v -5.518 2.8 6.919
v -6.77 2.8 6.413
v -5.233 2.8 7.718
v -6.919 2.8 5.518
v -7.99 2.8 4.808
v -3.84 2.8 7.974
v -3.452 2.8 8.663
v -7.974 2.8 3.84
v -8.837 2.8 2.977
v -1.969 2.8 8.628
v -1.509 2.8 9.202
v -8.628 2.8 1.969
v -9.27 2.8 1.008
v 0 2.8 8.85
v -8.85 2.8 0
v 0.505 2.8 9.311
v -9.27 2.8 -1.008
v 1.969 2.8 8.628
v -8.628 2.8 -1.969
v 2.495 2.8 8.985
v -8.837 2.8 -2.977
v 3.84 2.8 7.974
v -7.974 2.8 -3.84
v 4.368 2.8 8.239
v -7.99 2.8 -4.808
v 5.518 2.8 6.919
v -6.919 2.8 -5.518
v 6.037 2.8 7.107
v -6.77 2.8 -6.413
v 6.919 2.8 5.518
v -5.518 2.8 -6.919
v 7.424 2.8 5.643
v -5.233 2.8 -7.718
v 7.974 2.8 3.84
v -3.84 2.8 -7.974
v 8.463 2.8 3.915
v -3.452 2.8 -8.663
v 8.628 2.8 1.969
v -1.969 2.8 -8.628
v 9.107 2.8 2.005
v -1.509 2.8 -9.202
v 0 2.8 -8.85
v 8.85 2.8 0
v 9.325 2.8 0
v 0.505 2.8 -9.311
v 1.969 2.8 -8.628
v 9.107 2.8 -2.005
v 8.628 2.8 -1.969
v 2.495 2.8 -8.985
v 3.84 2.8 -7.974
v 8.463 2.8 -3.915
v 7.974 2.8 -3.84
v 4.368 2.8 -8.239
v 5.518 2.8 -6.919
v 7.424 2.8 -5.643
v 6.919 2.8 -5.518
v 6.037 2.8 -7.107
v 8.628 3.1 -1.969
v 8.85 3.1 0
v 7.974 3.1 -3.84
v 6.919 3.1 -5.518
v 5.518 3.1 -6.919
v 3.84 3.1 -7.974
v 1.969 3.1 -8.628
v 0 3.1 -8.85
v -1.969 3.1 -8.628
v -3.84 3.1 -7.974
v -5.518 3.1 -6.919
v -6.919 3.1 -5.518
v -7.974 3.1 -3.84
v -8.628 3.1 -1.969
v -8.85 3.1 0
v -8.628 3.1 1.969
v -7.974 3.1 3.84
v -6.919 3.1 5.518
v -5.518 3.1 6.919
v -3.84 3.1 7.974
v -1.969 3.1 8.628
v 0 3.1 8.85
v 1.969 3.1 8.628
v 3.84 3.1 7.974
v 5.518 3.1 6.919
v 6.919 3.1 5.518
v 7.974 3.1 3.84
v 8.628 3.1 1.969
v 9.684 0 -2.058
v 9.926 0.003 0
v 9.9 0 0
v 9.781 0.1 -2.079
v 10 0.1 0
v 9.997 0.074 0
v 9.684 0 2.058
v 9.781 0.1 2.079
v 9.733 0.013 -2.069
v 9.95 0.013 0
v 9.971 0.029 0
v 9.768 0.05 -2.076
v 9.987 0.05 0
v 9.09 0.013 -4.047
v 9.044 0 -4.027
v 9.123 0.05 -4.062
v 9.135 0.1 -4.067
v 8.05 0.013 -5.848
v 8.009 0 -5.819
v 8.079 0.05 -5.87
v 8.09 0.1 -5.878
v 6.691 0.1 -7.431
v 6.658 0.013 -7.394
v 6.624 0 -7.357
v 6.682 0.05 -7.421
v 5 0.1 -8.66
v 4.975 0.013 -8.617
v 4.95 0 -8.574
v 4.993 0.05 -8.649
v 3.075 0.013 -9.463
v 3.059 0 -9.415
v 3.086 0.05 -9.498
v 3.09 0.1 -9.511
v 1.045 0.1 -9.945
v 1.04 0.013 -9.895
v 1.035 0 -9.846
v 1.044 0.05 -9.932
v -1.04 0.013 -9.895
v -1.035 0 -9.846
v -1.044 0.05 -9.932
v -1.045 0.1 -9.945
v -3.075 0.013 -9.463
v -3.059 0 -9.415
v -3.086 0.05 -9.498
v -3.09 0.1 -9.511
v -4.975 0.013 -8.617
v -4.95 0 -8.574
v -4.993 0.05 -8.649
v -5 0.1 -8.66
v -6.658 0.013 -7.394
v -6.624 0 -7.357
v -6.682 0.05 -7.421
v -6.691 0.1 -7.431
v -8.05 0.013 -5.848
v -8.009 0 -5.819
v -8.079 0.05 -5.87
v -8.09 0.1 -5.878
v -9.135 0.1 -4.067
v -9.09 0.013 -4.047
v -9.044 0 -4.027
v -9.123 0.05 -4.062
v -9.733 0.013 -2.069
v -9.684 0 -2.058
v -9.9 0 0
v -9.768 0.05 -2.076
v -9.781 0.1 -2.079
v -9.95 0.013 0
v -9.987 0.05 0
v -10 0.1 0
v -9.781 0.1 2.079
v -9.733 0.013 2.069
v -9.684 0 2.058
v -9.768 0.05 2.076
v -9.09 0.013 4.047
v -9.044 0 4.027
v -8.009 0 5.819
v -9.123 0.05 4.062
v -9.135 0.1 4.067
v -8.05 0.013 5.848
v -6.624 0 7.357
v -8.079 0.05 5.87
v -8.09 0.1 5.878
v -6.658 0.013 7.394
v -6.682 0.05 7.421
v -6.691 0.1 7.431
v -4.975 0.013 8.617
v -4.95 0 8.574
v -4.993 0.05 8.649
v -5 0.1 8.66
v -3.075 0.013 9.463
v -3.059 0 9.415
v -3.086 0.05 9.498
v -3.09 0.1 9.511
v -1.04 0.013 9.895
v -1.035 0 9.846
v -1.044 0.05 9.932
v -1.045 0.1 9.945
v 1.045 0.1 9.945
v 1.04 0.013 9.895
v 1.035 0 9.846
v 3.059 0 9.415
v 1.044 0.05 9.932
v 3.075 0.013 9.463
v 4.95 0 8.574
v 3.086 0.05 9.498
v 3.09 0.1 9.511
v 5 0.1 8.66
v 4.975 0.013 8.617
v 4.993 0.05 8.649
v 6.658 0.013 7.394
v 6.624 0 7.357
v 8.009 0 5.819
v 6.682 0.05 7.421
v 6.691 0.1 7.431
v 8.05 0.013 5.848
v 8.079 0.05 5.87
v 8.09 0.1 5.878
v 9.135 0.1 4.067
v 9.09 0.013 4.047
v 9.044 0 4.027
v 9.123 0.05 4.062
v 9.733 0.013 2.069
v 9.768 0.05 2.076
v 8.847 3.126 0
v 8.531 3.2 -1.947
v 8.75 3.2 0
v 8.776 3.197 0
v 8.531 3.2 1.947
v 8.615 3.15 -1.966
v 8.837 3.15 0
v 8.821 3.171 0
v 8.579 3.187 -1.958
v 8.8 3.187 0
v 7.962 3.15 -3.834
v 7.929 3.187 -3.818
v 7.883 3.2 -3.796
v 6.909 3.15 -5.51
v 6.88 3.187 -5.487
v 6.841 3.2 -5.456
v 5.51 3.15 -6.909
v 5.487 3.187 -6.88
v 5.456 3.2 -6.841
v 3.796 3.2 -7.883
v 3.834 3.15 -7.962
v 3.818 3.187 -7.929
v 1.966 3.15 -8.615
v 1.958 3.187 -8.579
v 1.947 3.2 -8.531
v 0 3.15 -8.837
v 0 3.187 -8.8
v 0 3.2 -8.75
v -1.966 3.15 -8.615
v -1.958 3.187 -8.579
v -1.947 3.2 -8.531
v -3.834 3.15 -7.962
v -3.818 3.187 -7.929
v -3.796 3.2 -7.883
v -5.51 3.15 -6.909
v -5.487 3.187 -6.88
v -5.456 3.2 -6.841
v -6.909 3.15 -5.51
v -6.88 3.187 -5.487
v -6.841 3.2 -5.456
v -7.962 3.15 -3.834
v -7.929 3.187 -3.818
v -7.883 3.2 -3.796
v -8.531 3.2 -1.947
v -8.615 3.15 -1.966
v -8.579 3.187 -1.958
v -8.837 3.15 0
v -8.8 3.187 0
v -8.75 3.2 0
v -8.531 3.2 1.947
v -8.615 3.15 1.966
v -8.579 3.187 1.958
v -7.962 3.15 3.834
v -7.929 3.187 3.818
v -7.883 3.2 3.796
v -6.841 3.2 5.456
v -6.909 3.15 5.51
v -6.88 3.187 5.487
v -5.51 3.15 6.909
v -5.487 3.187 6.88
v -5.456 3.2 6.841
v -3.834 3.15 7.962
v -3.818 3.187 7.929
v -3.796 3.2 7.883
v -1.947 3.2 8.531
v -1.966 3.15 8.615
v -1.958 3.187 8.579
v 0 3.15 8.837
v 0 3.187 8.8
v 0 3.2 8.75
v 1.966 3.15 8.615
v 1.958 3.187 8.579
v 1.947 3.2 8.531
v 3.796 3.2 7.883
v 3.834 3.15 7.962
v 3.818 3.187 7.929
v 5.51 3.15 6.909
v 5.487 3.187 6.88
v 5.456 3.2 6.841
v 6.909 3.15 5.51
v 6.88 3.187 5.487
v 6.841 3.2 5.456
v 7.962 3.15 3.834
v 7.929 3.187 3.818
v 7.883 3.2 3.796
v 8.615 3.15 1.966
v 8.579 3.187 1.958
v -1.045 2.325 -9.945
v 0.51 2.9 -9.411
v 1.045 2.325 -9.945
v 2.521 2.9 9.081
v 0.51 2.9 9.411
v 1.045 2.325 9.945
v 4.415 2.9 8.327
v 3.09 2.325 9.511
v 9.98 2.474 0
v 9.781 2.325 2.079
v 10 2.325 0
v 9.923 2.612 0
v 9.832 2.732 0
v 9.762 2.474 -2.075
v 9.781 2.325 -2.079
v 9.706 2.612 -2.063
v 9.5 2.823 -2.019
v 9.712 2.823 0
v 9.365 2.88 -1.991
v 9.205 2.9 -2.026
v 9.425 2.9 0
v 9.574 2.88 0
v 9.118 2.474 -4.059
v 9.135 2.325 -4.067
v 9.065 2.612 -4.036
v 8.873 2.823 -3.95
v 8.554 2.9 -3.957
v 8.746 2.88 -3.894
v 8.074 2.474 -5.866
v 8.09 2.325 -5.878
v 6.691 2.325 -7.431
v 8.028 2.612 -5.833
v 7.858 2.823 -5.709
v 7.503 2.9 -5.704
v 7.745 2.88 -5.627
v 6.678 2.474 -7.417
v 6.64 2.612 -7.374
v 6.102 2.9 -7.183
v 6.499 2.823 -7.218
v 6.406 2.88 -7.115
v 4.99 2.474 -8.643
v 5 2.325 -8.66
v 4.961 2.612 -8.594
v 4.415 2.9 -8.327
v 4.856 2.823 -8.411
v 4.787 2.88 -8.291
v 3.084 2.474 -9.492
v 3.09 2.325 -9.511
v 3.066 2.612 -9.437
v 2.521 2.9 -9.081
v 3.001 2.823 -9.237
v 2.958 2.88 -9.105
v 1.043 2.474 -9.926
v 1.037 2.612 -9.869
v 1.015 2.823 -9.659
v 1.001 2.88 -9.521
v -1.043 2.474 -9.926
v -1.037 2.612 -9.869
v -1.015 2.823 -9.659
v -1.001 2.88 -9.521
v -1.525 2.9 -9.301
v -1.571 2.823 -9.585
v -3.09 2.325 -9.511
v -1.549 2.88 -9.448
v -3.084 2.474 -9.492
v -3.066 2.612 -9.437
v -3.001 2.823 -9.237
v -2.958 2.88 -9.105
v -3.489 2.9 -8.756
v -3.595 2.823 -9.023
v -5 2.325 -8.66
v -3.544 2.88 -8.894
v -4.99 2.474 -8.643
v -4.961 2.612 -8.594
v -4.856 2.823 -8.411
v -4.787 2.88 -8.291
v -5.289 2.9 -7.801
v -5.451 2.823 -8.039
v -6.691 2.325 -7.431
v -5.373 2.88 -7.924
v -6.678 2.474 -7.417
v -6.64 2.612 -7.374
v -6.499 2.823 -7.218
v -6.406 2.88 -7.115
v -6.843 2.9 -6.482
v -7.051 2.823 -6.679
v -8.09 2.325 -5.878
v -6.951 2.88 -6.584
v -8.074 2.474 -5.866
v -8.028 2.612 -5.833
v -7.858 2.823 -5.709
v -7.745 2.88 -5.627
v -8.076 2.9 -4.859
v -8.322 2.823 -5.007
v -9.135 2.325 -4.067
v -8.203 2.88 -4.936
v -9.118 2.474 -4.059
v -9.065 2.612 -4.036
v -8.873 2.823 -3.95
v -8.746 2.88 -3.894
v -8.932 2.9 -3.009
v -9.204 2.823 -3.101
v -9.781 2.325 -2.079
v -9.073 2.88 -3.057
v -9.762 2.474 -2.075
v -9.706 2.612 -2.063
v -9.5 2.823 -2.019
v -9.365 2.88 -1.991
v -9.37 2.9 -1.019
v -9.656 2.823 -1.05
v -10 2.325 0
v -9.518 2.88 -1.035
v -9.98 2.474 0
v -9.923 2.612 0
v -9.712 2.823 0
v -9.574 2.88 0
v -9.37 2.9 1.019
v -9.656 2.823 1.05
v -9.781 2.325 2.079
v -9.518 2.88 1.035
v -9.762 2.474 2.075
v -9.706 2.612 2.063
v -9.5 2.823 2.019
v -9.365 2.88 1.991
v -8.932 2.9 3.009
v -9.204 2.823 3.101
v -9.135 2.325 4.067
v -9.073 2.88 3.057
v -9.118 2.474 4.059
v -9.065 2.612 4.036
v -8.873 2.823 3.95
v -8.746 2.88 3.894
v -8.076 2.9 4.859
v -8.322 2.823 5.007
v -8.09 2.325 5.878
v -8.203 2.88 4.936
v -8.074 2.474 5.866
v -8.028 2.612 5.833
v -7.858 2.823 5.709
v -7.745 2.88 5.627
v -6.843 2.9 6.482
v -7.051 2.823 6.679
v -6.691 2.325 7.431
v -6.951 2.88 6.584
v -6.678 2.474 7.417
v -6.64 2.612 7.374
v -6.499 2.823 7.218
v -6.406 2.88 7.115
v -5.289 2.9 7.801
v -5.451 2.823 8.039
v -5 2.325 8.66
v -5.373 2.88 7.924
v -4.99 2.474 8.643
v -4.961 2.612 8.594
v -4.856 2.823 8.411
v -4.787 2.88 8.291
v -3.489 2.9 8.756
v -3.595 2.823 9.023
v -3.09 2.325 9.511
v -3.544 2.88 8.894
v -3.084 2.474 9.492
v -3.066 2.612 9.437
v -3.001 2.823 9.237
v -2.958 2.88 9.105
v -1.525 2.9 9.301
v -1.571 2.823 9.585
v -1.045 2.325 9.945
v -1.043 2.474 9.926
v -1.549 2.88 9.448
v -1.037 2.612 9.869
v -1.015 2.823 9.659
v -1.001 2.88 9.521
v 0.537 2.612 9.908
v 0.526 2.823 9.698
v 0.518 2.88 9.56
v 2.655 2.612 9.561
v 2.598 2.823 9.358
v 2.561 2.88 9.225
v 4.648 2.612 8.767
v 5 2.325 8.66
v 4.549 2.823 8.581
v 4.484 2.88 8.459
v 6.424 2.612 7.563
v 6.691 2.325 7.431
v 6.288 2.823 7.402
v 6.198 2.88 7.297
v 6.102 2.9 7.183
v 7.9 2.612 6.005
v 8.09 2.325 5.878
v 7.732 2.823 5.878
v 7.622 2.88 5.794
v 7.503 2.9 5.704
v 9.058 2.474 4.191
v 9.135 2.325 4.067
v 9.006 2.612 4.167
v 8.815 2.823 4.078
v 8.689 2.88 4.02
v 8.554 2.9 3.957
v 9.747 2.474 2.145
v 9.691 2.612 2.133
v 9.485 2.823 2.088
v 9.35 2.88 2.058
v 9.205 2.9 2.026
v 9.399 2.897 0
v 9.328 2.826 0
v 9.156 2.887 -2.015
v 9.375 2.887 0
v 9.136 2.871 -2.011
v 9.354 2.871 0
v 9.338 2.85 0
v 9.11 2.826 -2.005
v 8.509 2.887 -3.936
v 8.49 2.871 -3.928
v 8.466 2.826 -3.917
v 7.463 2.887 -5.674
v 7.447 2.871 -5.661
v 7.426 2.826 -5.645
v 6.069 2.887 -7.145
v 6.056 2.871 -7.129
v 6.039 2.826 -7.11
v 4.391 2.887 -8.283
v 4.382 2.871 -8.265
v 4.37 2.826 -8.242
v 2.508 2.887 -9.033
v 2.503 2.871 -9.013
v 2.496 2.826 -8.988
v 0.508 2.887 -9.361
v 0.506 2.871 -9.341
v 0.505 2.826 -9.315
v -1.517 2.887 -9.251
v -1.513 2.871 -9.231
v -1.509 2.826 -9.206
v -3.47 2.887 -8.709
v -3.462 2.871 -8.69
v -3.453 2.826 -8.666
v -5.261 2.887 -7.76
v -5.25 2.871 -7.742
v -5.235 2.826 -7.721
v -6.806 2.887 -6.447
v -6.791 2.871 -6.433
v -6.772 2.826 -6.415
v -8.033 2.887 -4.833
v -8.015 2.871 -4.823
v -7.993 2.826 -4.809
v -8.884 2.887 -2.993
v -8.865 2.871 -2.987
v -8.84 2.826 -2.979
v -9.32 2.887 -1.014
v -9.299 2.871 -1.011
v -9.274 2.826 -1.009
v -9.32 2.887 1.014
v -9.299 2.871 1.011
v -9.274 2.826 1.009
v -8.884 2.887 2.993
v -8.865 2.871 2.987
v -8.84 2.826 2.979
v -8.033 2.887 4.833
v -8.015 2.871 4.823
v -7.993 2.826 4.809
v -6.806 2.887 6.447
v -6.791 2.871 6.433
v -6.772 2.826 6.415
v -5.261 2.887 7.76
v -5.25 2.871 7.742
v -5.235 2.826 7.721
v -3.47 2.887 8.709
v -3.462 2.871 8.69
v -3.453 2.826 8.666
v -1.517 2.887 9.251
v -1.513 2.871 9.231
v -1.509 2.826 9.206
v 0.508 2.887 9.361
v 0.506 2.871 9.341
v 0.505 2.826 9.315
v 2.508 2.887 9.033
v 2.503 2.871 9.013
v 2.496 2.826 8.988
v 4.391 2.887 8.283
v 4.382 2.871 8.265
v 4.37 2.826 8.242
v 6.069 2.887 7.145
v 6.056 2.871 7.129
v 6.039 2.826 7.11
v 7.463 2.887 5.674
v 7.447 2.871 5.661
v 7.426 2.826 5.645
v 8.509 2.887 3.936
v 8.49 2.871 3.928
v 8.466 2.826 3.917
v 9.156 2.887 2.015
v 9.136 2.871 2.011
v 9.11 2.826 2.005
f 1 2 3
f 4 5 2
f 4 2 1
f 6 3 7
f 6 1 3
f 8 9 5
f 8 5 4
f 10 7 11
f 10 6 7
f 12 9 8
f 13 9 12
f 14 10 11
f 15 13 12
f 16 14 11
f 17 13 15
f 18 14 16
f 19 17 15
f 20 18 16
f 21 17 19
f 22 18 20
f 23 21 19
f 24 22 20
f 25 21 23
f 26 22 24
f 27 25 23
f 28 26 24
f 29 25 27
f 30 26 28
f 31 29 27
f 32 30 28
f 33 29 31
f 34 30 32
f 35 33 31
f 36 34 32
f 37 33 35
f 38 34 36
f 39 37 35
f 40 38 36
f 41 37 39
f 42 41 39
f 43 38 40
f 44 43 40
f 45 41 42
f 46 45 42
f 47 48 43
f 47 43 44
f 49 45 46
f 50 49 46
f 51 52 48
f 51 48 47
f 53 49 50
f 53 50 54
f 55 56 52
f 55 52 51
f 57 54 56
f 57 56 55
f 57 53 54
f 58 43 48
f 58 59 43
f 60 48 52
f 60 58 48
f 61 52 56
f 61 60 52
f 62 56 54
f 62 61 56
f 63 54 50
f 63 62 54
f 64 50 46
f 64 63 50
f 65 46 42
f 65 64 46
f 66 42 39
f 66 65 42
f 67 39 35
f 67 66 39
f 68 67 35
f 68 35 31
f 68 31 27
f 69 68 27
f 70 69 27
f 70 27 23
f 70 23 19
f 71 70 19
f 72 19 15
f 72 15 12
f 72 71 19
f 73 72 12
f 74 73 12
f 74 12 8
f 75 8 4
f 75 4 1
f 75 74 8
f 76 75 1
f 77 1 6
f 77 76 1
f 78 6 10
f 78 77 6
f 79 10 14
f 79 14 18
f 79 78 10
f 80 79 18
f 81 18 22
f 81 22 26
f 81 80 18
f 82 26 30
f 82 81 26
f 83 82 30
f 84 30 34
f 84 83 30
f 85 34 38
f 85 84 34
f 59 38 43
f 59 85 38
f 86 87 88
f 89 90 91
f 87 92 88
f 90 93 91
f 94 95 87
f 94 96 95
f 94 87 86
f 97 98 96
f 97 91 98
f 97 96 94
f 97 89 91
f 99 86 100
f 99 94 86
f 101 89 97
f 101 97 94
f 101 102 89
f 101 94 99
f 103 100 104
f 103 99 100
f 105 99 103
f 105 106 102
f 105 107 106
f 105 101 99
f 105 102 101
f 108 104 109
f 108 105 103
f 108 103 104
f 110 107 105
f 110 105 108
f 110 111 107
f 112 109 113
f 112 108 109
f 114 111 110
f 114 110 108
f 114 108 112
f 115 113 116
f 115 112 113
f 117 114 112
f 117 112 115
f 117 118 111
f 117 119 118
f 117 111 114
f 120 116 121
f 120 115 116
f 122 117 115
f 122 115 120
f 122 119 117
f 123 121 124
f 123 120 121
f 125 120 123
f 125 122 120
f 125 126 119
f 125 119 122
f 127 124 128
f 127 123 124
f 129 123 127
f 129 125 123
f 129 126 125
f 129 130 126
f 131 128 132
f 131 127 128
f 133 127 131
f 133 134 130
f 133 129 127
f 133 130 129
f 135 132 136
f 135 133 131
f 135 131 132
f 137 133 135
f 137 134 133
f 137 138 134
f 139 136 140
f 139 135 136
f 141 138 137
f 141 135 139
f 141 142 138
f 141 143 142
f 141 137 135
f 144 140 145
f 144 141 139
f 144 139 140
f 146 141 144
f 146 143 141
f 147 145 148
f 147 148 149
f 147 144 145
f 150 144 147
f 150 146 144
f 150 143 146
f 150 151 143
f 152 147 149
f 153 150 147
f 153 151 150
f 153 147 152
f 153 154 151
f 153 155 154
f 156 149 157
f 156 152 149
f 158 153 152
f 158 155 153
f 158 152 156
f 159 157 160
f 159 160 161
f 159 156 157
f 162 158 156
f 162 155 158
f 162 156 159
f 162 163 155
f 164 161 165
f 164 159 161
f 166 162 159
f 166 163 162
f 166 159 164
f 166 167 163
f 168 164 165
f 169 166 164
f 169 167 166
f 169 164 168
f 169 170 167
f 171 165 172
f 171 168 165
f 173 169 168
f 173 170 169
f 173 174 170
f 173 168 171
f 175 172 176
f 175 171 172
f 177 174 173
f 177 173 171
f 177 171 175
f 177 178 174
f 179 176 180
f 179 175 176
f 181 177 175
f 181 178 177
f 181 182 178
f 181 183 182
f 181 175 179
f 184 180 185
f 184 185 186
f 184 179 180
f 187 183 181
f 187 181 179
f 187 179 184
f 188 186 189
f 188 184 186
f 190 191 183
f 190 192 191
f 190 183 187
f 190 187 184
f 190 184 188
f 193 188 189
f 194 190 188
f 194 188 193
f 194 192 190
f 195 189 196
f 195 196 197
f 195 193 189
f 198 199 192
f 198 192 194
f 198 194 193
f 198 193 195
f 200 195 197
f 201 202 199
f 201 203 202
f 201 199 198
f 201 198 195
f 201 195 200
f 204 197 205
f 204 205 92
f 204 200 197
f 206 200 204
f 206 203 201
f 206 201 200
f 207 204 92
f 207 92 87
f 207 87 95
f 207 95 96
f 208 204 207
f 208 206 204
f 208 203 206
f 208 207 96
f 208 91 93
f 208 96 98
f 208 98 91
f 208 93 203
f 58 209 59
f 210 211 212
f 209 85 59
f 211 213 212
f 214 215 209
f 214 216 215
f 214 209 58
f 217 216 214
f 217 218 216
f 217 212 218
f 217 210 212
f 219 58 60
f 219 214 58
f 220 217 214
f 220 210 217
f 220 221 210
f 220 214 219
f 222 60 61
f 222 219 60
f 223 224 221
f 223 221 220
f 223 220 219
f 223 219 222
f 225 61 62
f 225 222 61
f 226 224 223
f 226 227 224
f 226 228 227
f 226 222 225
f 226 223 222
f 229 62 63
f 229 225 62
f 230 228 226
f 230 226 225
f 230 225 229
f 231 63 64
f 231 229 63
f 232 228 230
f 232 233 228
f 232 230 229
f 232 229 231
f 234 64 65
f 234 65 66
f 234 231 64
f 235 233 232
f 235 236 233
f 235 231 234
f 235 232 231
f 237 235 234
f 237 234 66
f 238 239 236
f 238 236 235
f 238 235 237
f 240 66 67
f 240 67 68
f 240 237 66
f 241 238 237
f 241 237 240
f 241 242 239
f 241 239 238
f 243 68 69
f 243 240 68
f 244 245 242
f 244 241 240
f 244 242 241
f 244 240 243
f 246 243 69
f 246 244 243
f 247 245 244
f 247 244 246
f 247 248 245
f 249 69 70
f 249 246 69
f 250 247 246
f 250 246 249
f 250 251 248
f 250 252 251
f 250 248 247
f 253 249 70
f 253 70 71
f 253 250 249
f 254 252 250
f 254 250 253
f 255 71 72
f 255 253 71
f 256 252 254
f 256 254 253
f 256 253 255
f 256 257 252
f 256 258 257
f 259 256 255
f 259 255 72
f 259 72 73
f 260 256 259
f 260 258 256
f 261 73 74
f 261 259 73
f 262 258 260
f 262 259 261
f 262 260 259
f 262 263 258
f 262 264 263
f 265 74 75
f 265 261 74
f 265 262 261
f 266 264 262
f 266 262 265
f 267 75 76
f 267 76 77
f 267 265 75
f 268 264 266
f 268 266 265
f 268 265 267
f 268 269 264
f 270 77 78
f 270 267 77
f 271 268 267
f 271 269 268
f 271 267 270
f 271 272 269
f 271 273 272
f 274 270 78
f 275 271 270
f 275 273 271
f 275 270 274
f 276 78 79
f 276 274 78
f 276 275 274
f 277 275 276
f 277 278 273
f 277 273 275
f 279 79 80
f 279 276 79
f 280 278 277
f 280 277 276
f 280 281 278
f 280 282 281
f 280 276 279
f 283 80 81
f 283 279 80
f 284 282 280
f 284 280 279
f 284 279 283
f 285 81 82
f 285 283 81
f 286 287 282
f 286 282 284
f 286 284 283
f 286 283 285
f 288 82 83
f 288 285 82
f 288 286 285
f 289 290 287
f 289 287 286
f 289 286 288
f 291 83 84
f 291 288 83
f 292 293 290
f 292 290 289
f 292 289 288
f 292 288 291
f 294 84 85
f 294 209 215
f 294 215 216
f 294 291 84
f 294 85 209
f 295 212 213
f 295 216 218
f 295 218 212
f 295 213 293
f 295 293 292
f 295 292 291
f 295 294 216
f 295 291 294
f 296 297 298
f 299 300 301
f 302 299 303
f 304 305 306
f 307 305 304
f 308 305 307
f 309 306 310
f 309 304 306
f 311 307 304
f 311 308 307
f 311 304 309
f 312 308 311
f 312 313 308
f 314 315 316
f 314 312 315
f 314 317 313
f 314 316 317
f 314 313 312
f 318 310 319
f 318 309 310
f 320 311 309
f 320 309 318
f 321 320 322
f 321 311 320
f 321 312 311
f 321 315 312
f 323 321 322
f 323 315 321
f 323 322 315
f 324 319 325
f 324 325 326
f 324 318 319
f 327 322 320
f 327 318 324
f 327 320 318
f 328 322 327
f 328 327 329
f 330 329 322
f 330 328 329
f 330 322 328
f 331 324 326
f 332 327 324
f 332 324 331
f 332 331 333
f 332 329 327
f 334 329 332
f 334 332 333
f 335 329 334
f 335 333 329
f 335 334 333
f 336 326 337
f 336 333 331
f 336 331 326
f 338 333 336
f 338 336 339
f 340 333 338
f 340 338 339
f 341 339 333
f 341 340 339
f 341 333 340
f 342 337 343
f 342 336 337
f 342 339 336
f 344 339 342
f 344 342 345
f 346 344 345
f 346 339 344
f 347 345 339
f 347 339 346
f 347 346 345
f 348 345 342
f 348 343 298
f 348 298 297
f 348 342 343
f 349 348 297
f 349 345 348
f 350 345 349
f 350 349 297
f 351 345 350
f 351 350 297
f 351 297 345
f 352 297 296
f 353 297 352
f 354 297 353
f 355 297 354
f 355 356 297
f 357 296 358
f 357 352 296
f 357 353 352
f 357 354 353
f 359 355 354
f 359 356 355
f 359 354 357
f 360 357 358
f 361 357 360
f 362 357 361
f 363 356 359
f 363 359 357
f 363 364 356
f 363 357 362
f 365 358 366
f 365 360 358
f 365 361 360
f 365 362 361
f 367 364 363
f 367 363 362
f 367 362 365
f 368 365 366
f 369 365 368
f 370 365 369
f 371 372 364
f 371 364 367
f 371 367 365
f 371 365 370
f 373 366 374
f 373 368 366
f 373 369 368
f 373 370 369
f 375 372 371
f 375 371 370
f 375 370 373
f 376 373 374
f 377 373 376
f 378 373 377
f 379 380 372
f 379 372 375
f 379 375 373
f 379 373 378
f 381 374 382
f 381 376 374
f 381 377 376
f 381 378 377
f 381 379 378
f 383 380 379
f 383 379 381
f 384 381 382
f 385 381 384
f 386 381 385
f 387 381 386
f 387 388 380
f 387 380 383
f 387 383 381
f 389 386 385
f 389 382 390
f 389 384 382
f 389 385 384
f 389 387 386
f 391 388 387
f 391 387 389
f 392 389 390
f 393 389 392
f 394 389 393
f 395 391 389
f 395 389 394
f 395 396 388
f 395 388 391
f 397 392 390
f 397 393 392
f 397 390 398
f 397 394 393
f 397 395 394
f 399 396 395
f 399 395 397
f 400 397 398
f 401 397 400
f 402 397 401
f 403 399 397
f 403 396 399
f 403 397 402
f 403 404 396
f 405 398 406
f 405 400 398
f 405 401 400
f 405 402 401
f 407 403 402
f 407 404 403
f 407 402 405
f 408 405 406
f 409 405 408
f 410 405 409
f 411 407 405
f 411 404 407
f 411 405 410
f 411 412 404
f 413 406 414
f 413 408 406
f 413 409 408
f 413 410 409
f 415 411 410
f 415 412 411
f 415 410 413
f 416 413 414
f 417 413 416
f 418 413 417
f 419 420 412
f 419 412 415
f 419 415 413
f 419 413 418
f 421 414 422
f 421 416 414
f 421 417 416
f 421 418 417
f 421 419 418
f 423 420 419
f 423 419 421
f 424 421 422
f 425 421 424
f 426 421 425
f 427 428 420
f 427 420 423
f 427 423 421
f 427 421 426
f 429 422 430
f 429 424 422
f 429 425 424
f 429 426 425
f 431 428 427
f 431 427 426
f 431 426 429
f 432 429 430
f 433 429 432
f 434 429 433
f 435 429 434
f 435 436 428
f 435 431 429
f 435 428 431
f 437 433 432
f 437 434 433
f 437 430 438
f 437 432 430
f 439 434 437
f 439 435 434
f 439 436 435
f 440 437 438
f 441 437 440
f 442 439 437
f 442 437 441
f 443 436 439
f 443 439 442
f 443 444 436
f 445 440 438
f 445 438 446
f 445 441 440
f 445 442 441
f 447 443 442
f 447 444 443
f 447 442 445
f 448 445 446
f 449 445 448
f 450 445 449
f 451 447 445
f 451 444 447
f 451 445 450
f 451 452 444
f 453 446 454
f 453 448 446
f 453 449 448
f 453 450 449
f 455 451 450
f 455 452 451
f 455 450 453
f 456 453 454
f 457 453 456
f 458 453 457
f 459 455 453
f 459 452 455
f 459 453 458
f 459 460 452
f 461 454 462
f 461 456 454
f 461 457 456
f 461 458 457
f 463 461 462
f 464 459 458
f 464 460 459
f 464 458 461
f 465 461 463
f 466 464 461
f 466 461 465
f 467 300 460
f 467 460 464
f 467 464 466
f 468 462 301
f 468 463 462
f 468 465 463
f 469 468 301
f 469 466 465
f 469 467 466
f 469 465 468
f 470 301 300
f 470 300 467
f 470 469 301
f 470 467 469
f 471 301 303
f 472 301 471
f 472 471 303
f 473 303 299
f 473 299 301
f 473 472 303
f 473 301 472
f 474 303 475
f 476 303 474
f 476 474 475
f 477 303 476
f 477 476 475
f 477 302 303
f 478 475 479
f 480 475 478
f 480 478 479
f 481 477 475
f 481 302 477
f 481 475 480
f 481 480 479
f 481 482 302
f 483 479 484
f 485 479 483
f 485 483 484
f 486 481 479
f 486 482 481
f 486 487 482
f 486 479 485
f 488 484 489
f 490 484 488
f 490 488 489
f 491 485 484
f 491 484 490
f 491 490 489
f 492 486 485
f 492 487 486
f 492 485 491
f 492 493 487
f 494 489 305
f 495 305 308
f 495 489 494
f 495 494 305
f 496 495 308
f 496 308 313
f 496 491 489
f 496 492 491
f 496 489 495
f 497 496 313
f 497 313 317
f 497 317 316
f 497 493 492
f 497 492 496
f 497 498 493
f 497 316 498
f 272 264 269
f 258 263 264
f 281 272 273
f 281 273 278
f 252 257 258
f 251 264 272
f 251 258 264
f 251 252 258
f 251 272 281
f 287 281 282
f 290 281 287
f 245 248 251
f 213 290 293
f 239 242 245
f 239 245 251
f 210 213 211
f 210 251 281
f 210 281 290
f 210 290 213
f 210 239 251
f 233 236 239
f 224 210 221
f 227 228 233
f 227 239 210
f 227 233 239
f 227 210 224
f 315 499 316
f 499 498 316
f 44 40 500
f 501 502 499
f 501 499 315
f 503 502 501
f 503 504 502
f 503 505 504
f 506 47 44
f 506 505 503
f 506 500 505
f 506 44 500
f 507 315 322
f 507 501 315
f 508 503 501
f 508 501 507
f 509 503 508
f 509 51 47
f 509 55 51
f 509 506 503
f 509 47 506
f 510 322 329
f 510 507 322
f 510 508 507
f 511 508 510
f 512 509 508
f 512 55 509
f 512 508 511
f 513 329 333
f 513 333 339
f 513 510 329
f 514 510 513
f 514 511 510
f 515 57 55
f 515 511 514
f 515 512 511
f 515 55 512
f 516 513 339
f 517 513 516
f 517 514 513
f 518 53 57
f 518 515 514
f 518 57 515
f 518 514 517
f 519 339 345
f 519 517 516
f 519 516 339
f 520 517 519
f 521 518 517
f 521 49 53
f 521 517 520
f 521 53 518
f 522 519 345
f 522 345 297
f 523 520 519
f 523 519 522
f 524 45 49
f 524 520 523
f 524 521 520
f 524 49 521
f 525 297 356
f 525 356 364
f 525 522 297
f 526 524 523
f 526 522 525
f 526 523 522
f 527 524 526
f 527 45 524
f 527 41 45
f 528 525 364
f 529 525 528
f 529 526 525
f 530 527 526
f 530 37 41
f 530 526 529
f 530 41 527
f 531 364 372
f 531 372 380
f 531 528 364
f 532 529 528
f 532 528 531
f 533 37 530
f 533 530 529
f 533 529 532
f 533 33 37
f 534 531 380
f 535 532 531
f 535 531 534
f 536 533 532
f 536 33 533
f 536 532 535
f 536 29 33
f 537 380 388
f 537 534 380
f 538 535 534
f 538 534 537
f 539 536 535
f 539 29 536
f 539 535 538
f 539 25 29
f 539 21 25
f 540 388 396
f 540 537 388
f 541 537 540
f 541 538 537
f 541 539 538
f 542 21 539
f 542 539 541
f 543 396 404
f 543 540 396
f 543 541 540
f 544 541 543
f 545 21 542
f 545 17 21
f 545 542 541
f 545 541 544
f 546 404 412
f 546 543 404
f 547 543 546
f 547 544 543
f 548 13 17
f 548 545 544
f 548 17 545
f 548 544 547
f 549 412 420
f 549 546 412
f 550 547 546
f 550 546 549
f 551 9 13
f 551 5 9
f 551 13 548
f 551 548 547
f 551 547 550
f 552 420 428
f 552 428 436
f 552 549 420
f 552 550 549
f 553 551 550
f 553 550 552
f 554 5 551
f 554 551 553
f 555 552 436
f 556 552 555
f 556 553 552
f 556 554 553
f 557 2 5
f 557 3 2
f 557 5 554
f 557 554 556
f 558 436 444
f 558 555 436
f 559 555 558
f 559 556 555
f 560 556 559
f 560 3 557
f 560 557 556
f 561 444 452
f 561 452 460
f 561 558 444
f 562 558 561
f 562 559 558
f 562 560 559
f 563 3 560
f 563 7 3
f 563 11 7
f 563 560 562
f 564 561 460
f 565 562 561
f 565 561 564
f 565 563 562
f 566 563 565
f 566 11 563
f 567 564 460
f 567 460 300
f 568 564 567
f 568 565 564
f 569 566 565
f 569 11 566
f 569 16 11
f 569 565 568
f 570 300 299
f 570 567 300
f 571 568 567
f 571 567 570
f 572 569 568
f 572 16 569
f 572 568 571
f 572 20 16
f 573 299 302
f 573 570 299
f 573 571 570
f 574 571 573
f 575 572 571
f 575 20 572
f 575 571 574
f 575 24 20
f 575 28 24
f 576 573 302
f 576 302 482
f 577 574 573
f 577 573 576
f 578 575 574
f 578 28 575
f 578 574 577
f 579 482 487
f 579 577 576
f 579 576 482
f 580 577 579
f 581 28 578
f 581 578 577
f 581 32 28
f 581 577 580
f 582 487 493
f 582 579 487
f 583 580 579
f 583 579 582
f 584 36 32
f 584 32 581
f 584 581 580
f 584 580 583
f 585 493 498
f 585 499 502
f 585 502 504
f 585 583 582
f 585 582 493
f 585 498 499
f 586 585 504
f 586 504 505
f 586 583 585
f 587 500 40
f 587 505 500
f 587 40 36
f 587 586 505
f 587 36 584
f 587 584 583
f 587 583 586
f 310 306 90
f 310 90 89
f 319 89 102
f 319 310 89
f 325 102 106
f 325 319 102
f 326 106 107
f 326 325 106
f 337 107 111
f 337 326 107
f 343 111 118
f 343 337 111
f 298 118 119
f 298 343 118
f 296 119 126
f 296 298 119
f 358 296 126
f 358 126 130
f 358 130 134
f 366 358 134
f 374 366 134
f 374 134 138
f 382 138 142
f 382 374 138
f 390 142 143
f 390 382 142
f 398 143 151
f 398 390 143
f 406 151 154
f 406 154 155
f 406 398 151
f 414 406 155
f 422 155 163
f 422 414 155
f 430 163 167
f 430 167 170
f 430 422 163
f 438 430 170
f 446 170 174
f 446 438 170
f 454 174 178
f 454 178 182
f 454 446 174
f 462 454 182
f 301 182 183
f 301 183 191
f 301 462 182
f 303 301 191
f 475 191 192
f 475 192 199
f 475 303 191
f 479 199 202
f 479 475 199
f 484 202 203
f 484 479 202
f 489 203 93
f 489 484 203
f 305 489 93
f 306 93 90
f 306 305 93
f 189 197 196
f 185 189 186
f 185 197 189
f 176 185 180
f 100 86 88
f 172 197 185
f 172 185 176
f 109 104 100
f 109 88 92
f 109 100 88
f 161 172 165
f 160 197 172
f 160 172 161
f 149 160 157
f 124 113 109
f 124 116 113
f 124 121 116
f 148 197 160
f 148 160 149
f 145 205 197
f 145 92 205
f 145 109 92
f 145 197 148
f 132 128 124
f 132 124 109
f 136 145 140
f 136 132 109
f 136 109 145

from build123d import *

# Parameters (mm, degrees)
FILLET1_R = 0.1


with BuildPart() as part:
    # Sketch1 → Revolve1 (revolve)
    with BuildSketch(Plane.XY):
        with BuildLine():
            Line((0, 0), (10, 0))
            Line((10, 0), (10, 2.325))
            ThreePointArc((10, 2.325), (9.831586399, 2.731586399), (9.425, 2.9))
            ThreePointArc((9.425, 2.9), (9.354289322, 2.870710678), (9.325, 2.8))
            Line((9.325, 2.8), (8.85, 2.8))
            Line((8.85, 2.8), (8.85, 3.1))
            ThreePointArc((8.85, 3.1), (8.820710678, 3.170710678), (8.75, 3.2))
            Line((8.75, 3.2), (0, 3.2))
            Line((0, 3.2), (0, 0))
        make_face()
    revolve(axis=Axis((0, 0, 0), (0, 1, 0)))

    # Fillet1
    fillet1_edges = [part.edges().sort_by_distance(p)[0] for p in [
        (-10, 0, 0),
    ]]
    fillet(fillet1_edges, radius=FILLET1_R)


solid = part.part
